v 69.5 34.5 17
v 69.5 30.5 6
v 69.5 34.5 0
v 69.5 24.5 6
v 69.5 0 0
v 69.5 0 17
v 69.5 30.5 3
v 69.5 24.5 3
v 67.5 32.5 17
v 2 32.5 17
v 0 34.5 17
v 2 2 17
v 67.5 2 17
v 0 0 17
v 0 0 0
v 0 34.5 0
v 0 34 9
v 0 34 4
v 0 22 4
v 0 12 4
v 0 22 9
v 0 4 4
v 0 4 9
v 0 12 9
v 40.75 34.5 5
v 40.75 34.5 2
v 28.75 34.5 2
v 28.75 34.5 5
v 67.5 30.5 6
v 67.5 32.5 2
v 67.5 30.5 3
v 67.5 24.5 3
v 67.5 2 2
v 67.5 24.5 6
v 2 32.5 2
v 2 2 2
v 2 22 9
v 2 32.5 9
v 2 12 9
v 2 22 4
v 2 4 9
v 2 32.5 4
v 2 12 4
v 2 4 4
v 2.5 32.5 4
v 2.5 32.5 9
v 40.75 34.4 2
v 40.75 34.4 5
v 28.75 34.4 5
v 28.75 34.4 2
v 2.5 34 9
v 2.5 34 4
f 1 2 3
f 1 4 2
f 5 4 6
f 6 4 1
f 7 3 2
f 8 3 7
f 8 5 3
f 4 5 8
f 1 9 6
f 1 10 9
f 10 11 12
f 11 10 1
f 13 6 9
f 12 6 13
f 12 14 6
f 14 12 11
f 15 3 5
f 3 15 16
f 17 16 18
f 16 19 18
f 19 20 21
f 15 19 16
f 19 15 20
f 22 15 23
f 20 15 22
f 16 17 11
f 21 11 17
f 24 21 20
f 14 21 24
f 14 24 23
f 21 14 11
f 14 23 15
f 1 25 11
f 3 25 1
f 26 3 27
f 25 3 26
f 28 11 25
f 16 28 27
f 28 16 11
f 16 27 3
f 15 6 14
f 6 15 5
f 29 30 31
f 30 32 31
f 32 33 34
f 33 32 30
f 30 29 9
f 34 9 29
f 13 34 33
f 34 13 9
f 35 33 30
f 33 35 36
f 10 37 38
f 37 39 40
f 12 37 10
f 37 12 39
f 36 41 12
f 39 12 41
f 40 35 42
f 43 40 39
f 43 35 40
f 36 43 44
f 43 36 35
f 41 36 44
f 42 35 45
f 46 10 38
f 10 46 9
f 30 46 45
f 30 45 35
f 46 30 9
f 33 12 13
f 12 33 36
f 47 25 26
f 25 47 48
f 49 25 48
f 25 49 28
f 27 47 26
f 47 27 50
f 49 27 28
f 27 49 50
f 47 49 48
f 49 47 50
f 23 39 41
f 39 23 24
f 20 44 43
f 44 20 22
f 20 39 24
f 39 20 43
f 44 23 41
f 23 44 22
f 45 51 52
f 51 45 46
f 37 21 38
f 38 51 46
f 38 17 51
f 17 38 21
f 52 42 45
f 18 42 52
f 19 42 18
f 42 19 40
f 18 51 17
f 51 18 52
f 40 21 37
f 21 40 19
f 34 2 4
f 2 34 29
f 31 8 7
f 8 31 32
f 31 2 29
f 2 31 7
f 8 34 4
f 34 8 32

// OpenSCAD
// Pi Zero 2 W + Camera Module v3 Enclosure
// Physical MCP v1.0 Hardware
// OpenSCAD file - export to STL for 3D printing

// Dimensions (mm)
pi_length = 65;
pi_width = 30;
pi_height = 5;  // PCB thickness

// Camera module dimensions
cam_width = 25;
cam_length = 24;
cam_height = 10;

// Wall thickness
wall = 2;

// Clearances
tolerance = 0.5;

// Total enclosure dimensions
box_l = pi_length + wall*2 + tolerance;
box_w = pi_width + wall*2 + tolerance;
box_h = pi_height + wall*2 + 8;  // Extra height for cable bend

// Module: main enclosure
module enclosure_body() {
    difference() {
        // Outer shell
        cube([box_l, box_w, box_h]);
        
        // Inner cavity for Pi
        translate([wall, wall, wall])
            cube([pi_length + tolerance, pi_width + tolerance, box_h - wall]);
        
        // Cable exit slot (camera flex cable)
        translate([box_l/2 - 6, box_w - 0.1, wall])
            cube([12, wall + tolerance + 0.1, 3]);
        
        // USB-C power port
        translate([-0.1, wall + 2, wall + 2])
            cube([wall + tolerance + 0.1, 8, 5]);
        
        // HDMI mini (optional access)
        translate([-0.1, wall + 20, wall + 2])
            cube([wall + tolerance + 0.1, 12, 5]);
        
        // Ventilation holes (top)
        for (i = [10:6:box_l-10]) {
            for (j = [wall+2:6:box_w-wall-2]) {
                translate([i, j, box_h - 0.5])
                    cylinder(h = wall + 1, d = 3, $fn=12);
            }
        }
        
        // Status LED window
        translate([box_l - wall - 0.1, box_w - wall - 8, wall + 1])
            cube([wall + 0.1, 6, 3]);
    }
}

// Module: camera holder (attached to lid or separate)
module camera_holder() {
    difference() {
        // Base mount
        cube([cam_length + wall*2, cam_width + wall*2, cam_height + wall]);
        
        // Camera cavity
        translate([wall, wall, wall])
            cube([cam_length + tolerance, cam_width + tolerance, cam_height]);
        
        // Lens hole
        translate([cam_length/2 + wall, cam_width/2 + wall, -0.1])
            cylinder(h = wall + 0.2, d = 8, $fn=32);
        
        // Mounting holes (for camera module screws)
        translate([cam_length/2 + wall - 10, cam_width/2 + wall - 6, -0.1])
            cylinder(h = wall + 0.2, d = 2, $fn=8);
        translate([cam_length/2 + wall + 10, cam_width/2 + wall - 6, -0.1])
            cylinder(h = wall + 0.2, d = 2, $fn=8);
    }
}

// Module: snap-fit lid
module lid() {
    lid_h = 2;
    difference() {
        // Flat lid
        cube([box_l, box_w, lid_h]);
        
        // Inner ridge for fit
        translate([wall - 0.3, wall - 0.3, -0.1])
            cube([pi_length + tolerance + 0.6, pi_width + tolerance + 0.6, lid_h + 0.2]);
    }
    
    // Snap-fit tabs
    translate([0, box_w/2 - 2, lid_h])
        cube([wall, 4, 2]);
    translate([box_l - wall, box_w/2 - 2, lid_h])
        cube([wall, 4, 2]);
}

// Module: mounting bracket (wall/ceiling)
module mounting_bracket() {
    bracket_thickness = 3;
    bracket_width = 30;
    bracket_height = 15;
    
    difference() {
        union() {
            // Wall plate
            cube([40, bracket_width, bracket_thickness]);
            // Angle support
            translate([0, 0, 0])
                rotate([0, 90, 0])
                linear_extrude(height = 40)
                polygon([[0,0], [bracket_height,0], [0,bracket_thickness]]);
        }
        // Screw holes
        translate([8, bracket_width/2, -0.1])
            cylinder(h = bracket_thickness + 0.2, d = 4, $fn=16);
        translate([32, bracket_width/2, -0.1])
            cylinder(h = bracket_thickness + 0.2, d = 4, $fn=16);
    }
}

// Assembly preview
module full_assembly() {
    // Main enclosure
    color("lightgray")
        enclosure_body();
    
    // Camera mount (separate piece that clips on)
    translate([box_l + 5, 0, 0])
        color("white")
        camera_holder();
    
    // Lid (exploded view)
    translate([0, 0, box_h + 5])
        color("darkgray")
        lid();
    
    // Mounting bracket
    translate([0, box_w + 10, 0])
        color("black")
        mounting_bracket();
}

// Render options
// Uncomment one:
// full_assembly();

// For STL export, uncomment individual parts:
 enclosure_body();  // Main case
// translate([box_l + 10, 0, 0]) camera_holder();  // Camera mount
// translate([0, box_w + 10, 0]) lid();  // Lid
// translate([0, box_w * 2 + 15, 0]) mounting_bracket();  // Wall mount

// Instructions:
// 1. Open in OpenSCAD (https://openscad.org/)
// 2. Uncomment the part you want to export
// 3. Render (F6) then export STL
// 4. Print at 0.2mm layer height, 20% infill, no supports needed
